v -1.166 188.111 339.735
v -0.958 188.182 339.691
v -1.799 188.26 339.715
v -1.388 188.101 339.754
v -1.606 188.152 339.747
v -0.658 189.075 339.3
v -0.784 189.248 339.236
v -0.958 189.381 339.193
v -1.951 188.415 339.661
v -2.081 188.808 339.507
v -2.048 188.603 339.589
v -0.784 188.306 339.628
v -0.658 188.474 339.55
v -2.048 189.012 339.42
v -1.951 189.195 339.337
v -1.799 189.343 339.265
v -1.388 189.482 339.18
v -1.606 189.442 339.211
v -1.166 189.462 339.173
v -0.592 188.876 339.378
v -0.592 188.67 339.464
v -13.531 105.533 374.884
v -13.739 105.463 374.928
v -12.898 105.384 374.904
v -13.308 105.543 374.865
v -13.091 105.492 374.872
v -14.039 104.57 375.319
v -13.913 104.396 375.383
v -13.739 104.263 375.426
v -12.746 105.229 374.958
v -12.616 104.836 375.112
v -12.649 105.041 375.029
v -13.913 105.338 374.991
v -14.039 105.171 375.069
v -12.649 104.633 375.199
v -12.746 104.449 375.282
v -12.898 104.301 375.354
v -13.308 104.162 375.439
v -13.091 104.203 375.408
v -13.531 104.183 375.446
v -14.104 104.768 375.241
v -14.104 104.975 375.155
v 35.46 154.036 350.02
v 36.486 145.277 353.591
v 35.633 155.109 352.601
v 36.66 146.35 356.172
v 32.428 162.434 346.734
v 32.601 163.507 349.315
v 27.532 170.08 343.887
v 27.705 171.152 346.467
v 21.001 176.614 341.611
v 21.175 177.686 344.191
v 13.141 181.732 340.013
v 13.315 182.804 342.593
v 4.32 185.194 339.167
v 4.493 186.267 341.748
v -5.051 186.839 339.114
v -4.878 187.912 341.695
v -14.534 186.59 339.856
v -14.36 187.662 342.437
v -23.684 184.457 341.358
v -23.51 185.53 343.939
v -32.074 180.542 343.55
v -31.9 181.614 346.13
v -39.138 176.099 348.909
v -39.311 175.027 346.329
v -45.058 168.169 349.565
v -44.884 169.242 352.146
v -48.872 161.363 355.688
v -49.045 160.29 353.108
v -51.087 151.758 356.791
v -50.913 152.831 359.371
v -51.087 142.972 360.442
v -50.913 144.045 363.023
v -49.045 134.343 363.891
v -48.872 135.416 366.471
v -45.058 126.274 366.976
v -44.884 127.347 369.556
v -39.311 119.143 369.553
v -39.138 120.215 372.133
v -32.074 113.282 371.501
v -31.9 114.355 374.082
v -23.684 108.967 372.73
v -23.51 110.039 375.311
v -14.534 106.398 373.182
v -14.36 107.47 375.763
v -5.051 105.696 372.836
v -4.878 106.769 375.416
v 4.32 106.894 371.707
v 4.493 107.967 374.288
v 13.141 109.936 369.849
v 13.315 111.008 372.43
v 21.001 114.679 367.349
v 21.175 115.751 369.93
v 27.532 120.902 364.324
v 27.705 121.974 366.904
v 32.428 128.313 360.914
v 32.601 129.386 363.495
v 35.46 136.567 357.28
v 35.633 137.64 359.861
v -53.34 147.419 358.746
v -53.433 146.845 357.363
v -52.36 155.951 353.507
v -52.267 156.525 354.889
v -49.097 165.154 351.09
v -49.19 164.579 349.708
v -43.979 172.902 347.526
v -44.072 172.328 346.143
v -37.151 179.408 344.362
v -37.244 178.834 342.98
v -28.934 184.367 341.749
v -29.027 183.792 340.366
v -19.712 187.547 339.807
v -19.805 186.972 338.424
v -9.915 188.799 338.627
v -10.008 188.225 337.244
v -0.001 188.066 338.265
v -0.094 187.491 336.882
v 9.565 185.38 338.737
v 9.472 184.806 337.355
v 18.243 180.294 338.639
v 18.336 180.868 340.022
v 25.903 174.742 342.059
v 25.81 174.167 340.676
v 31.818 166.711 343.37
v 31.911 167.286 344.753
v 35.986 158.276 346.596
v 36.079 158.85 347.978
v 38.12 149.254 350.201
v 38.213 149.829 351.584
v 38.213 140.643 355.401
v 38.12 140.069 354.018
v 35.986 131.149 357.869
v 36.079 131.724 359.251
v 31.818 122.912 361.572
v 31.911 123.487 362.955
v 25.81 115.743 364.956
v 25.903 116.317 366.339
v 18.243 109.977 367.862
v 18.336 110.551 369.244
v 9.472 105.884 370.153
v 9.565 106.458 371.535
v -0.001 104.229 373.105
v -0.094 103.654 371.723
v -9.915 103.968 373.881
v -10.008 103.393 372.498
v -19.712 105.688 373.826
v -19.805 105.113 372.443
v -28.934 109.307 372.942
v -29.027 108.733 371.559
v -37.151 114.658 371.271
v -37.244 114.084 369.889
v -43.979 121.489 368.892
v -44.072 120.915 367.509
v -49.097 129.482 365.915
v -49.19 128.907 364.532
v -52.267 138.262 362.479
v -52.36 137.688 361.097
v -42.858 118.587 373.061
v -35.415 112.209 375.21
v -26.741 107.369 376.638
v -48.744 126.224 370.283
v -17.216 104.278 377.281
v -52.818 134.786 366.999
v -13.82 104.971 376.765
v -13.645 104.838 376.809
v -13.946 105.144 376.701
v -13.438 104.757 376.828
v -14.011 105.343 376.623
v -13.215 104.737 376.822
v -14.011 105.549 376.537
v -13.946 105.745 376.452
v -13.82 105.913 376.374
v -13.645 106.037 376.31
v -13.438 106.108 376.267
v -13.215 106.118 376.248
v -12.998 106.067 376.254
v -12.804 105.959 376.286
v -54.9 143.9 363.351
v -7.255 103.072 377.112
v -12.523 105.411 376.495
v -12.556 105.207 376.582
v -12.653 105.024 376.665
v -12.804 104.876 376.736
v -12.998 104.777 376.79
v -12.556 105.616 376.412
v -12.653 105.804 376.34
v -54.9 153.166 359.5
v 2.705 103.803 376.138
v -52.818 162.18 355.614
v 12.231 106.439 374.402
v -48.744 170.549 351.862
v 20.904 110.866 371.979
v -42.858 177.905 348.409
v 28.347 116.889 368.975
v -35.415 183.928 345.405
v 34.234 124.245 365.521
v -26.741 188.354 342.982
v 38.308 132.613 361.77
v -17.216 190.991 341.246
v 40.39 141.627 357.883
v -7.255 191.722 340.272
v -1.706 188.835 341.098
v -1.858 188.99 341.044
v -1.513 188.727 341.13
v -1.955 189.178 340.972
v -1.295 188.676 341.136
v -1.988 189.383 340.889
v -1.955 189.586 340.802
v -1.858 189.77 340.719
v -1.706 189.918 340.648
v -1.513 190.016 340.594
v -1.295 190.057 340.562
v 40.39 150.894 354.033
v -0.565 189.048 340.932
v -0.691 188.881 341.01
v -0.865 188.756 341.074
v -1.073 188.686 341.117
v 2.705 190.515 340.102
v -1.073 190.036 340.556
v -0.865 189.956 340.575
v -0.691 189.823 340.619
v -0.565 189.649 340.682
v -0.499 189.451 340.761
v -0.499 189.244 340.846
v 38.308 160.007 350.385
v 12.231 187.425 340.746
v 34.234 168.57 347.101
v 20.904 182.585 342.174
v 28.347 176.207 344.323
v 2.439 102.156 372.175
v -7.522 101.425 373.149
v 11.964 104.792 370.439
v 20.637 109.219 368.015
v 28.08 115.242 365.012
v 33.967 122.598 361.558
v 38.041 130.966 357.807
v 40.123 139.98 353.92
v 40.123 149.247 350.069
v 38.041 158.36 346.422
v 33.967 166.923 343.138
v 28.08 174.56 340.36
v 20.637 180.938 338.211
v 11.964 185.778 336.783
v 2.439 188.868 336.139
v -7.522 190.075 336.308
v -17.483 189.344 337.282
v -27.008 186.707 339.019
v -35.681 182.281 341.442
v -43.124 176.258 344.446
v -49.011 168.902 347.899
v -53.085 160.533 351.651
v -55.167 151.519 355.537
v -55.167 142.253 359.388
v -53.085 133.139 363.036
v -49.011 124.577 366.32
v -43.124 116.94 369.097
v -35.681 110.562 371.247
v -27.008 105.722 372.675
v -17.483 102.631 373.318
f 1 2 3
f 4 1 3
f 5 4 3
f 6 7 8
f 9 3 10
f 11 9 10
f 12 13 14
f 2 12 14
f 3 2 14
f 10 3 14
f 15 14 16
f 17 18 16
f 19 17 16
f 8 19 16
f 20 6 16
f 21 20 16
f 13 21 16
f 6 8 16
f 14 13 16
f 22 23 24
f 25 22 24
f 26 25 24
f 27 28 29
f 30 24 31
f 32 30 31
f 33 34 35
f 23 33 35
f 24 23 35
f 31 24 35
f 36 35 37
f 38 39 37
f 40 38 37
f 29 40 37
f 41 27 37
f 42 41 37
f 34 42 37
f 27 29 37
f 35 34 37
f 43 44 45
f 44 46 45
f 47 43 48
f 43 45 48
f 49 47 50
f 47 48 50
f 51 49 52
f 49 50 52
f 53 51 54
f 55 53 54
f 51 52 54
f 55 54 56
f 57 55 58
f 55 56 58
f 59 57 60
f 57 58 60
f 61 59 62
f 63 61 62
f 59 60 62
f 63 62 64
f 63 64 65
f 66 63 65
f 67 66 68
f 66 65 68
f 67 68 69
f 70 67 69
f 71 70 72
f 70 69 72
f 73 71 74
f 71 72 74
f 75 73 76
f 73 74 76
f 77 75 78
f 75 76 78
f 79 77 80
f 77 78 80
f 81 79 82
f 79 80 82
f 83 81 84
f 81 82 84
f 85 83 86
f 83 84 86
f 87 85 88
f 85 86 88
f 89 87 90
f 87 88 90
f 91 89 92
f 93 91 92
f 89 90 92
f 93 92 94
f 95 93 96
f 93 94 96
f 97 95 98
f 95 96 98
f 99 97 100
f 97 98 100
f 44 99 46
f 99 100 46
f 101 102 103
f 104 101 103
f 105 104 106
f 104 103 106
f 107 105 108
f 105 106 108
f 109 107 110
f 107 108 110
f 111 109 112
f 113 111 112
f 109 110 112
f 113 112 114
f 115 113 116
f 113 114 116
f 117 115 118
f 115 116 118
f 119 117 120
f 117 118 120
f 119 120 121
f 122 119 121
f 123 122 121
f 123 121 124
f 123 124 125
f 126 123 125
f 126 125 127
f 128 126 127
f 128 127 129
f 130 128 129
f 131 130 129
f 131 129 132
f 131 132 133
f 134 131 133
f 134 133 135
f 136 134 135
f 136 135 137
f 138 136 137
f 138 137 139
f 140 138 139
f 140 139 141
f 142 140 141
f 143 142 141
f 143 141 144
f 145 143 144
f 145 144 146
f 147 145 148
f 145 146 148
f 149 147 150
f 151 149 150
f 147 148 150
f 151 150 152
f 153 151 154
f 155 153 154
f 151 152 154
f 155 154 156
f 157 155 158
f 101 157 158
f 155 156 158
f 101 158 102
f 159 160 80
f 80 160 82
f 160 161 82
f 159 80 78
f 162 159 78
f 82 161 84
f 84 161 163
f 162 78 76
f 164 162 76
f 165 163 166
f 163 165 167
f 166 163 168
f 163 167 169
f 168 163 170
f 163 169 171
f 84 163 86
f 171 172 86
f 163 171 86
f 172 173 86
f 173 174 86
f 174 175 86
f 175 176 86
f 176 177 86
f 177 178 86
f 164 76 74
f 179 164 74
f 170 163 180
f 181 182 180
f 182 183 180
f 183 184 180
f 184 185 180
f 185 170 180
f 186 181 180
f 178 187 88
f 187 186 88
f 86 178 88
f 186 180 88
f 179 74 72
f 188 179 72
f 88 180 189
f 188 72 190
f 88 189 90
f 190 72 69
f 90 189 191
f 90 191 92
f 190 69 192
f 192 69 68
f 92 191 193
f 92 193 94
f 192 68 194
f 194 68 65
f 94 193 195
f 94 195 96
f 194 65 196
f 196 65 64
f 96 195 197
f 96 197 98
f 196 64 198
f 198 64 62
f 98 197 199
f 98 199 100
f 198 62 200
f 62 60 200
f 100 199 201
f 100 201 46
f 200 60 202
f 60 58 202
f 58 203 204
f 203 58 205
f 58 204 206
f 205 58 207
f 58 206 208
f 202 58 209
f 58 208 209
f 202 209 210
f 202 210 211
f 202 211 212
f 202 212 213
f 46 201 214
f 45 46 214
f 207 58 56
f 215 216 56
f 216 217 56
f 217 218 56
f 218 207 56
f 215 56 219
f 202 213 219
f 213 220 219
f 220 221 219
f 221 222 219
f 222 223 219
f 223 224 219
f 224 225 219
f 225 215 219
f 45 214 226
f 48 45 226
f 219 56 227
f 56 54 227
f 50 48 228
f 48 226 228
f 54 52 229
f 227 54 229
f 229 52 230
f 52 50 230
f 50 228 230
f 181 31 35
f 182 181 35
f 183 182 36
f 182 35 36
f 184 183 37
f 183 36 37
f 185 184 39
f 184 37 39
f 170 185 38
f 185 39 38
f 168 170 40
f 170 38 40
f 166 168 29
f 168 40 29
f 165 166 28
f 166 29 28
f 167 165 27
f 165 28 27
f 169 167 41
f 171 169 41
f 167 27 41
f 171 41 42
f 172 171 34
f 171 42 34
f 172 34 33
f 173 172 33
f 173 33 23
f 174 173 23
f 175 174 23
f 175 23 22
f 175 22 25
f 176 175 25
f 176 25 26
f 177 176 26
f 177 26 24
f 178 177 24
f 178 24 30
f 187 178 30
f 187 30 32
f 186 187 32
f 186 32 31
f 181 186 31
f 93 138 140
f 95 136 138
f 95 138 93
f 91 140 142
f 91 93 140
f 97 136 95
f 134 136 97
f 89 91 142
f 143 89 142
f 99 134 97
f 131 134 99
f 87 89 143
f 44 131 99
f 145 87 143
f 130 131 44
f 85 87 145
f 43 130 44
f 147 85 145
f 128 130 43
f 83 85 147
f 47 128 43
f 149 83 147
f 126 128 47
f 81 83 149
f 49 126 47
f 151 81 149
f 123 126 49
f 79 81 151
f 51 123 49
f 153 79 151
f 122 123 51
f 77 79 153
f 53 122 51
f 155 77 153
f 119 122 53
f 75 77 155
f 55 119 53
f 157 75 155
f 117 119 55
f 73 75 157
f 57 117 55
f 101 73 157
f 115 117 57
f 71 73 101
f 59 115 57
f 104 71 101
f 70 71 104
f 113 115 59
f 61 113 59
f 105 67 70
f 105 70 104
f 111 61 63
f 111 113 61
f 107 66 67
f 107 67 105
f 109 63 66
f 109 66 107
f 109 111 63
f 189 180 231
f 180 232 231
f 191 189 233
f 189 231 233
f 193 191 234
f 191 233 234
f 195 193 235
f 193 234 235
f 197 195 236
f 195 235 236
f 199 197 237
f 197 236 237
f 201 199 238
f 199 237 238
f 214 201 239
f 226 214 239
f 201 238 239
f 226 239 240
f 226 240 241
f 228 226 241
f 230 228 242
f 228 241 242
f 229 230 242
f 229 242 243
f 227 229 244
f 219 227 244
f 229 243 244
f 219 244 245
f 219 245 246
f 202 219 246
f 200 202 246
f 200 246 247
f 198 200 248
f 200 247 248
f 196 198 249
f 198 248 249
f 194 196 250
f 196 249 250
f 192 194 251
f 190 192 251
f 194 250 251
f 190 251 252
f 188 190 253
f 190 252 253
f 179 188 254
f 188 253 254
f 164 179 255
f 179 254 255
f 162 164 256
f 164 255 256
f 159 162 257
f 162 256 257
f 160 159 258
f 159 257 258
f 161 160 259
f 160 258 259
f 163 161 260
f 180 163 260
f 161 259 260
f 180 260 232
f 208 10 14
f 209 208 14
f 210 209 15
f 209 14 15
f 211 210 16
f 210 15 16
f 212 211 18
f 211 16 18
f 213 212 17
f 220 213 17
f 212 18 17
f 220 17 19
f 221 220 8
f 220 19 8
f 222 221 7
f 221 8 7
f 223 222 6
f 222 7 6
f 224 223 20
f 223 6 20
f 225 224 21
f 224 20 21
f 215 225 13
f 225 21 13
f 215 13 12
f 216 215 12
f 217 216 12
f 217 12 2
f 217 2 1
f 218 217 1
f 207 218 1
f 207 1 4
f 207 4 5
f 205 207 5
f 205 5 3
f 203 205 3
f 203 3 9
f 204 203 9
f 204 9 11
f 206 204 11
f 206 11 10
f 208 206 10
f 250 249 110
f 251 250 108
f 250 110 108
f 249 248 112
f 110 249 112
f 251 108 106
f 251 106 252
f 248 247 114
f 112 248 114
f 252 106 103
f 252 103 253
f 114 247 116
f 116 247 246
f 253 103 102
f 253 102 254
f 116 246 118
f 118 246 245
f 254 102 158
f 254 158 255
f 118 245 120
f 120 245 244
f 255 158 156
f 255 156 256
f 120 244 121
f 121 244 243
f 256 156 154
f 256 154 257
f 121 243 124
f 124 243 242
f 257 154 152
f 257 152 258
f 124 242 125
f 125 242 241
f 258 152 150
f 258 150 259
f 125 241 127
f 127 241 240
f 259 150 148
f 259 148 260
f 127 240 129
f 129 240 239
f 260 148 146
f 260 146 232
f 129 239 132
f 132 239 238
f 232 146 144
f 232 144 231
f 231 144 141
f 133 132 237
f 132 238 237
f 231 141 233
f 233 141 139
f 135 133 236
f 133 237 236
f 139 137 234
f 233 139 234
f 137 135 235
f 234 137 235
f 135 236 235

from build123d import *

# Parameters (mm, degrees)
PER_AGE1_D                   = 1.5
PER_AGE1_DEPTH               = 1.5
R_P_TITION_CIRCULAIRE1_COUNT = 2
PER_AGE3_D                   = 88
PER_AGE3_DEPTH               = 41.419450184
PER_AGE3_CBORE_D             = 92
PER_AGE3_CBORE_DEPTH         = 1.5


with BuildPart() as part:
    # Esquisse1 → Révolution1 (revolve)
    with BuildSketch(Plane(origin=(0, -1.422218517, 0.591043356), x_dir=(-1, 0, 0), z_dir=(0, 0.923433296037535, -0.38375897093000255)), mode=Mode.PRIVATE) as r_volution1_sk:
        Polygon((-40.385642644, 380.524269691), (7.521954057, 383.501210806), (7.255269748, 387.792933011), (-40.652326952, 384.815991896), align=None)
    revolve(r_volution1_sk.sketch.rotate(Axis((-7.683193189, 144.754032103, 352.33270189), (0.062019606567244694, 0.3830202085297531, 0.9216556234619678)), 270), axis=Axis((-7.683193189, 144.754032103, 352.33270189), (0.062019606567244694, 0.3830202085297531, 0.9216556234619678)))

    # Perçage1
    with Locations(Plane(origin=(23.97655886, 148.074247526, 356.308779232), x_dir=(0.9980749312557872, -0.023800580393729533, -0.05727096971134188), z_dir=(0.062019606567244694, 0.3830202085297554, 0.9216556234619669))):
        with Locations((-25.264524434, 44.063242824)):
            per_age1 = Hole(PER_AGE1_D / 2, depth=PER_AGE1_DEPTH)

    # Répétition circulaire1: Perçage1 ×2 about axis
    r_p_tition_circulaire1_axis = Axis((-31.231828608, -0.677449137, 2.383170434), (0.062019606567244756, 0.3830202085297553, 0.9216556234619669))
    for i in range(1, R_P_TITION_CIRCULAIRE1_COUNT):
        add(per_age1.rotate(r_p_tition_circulaire1_axis, i * 360 / R_P_TITION_CIRCULAIRE1_COUNT), mode=Mode.SUBTRACT)

    # Perçage3
    with Locations(Plane(origin=(23.709874552, 146.42726063, 352.345660051), x_dir=(-0.9980749312557872, 0.023800580393729533, 0.05727096971134188), z_dir=(-0.062019606567244694, -0.3830202085297554, -0.9216556234619669))):
        with Locations((31.29206799, -1.540142123)):
            CounterBoreHole(PER_AGE3_D / 2, PER_AGE3_CBORE_D / 2, PER_AGE3_CBORE_DEPTH, depth=PER_AGE3_DEPTH)


solid = part.part
